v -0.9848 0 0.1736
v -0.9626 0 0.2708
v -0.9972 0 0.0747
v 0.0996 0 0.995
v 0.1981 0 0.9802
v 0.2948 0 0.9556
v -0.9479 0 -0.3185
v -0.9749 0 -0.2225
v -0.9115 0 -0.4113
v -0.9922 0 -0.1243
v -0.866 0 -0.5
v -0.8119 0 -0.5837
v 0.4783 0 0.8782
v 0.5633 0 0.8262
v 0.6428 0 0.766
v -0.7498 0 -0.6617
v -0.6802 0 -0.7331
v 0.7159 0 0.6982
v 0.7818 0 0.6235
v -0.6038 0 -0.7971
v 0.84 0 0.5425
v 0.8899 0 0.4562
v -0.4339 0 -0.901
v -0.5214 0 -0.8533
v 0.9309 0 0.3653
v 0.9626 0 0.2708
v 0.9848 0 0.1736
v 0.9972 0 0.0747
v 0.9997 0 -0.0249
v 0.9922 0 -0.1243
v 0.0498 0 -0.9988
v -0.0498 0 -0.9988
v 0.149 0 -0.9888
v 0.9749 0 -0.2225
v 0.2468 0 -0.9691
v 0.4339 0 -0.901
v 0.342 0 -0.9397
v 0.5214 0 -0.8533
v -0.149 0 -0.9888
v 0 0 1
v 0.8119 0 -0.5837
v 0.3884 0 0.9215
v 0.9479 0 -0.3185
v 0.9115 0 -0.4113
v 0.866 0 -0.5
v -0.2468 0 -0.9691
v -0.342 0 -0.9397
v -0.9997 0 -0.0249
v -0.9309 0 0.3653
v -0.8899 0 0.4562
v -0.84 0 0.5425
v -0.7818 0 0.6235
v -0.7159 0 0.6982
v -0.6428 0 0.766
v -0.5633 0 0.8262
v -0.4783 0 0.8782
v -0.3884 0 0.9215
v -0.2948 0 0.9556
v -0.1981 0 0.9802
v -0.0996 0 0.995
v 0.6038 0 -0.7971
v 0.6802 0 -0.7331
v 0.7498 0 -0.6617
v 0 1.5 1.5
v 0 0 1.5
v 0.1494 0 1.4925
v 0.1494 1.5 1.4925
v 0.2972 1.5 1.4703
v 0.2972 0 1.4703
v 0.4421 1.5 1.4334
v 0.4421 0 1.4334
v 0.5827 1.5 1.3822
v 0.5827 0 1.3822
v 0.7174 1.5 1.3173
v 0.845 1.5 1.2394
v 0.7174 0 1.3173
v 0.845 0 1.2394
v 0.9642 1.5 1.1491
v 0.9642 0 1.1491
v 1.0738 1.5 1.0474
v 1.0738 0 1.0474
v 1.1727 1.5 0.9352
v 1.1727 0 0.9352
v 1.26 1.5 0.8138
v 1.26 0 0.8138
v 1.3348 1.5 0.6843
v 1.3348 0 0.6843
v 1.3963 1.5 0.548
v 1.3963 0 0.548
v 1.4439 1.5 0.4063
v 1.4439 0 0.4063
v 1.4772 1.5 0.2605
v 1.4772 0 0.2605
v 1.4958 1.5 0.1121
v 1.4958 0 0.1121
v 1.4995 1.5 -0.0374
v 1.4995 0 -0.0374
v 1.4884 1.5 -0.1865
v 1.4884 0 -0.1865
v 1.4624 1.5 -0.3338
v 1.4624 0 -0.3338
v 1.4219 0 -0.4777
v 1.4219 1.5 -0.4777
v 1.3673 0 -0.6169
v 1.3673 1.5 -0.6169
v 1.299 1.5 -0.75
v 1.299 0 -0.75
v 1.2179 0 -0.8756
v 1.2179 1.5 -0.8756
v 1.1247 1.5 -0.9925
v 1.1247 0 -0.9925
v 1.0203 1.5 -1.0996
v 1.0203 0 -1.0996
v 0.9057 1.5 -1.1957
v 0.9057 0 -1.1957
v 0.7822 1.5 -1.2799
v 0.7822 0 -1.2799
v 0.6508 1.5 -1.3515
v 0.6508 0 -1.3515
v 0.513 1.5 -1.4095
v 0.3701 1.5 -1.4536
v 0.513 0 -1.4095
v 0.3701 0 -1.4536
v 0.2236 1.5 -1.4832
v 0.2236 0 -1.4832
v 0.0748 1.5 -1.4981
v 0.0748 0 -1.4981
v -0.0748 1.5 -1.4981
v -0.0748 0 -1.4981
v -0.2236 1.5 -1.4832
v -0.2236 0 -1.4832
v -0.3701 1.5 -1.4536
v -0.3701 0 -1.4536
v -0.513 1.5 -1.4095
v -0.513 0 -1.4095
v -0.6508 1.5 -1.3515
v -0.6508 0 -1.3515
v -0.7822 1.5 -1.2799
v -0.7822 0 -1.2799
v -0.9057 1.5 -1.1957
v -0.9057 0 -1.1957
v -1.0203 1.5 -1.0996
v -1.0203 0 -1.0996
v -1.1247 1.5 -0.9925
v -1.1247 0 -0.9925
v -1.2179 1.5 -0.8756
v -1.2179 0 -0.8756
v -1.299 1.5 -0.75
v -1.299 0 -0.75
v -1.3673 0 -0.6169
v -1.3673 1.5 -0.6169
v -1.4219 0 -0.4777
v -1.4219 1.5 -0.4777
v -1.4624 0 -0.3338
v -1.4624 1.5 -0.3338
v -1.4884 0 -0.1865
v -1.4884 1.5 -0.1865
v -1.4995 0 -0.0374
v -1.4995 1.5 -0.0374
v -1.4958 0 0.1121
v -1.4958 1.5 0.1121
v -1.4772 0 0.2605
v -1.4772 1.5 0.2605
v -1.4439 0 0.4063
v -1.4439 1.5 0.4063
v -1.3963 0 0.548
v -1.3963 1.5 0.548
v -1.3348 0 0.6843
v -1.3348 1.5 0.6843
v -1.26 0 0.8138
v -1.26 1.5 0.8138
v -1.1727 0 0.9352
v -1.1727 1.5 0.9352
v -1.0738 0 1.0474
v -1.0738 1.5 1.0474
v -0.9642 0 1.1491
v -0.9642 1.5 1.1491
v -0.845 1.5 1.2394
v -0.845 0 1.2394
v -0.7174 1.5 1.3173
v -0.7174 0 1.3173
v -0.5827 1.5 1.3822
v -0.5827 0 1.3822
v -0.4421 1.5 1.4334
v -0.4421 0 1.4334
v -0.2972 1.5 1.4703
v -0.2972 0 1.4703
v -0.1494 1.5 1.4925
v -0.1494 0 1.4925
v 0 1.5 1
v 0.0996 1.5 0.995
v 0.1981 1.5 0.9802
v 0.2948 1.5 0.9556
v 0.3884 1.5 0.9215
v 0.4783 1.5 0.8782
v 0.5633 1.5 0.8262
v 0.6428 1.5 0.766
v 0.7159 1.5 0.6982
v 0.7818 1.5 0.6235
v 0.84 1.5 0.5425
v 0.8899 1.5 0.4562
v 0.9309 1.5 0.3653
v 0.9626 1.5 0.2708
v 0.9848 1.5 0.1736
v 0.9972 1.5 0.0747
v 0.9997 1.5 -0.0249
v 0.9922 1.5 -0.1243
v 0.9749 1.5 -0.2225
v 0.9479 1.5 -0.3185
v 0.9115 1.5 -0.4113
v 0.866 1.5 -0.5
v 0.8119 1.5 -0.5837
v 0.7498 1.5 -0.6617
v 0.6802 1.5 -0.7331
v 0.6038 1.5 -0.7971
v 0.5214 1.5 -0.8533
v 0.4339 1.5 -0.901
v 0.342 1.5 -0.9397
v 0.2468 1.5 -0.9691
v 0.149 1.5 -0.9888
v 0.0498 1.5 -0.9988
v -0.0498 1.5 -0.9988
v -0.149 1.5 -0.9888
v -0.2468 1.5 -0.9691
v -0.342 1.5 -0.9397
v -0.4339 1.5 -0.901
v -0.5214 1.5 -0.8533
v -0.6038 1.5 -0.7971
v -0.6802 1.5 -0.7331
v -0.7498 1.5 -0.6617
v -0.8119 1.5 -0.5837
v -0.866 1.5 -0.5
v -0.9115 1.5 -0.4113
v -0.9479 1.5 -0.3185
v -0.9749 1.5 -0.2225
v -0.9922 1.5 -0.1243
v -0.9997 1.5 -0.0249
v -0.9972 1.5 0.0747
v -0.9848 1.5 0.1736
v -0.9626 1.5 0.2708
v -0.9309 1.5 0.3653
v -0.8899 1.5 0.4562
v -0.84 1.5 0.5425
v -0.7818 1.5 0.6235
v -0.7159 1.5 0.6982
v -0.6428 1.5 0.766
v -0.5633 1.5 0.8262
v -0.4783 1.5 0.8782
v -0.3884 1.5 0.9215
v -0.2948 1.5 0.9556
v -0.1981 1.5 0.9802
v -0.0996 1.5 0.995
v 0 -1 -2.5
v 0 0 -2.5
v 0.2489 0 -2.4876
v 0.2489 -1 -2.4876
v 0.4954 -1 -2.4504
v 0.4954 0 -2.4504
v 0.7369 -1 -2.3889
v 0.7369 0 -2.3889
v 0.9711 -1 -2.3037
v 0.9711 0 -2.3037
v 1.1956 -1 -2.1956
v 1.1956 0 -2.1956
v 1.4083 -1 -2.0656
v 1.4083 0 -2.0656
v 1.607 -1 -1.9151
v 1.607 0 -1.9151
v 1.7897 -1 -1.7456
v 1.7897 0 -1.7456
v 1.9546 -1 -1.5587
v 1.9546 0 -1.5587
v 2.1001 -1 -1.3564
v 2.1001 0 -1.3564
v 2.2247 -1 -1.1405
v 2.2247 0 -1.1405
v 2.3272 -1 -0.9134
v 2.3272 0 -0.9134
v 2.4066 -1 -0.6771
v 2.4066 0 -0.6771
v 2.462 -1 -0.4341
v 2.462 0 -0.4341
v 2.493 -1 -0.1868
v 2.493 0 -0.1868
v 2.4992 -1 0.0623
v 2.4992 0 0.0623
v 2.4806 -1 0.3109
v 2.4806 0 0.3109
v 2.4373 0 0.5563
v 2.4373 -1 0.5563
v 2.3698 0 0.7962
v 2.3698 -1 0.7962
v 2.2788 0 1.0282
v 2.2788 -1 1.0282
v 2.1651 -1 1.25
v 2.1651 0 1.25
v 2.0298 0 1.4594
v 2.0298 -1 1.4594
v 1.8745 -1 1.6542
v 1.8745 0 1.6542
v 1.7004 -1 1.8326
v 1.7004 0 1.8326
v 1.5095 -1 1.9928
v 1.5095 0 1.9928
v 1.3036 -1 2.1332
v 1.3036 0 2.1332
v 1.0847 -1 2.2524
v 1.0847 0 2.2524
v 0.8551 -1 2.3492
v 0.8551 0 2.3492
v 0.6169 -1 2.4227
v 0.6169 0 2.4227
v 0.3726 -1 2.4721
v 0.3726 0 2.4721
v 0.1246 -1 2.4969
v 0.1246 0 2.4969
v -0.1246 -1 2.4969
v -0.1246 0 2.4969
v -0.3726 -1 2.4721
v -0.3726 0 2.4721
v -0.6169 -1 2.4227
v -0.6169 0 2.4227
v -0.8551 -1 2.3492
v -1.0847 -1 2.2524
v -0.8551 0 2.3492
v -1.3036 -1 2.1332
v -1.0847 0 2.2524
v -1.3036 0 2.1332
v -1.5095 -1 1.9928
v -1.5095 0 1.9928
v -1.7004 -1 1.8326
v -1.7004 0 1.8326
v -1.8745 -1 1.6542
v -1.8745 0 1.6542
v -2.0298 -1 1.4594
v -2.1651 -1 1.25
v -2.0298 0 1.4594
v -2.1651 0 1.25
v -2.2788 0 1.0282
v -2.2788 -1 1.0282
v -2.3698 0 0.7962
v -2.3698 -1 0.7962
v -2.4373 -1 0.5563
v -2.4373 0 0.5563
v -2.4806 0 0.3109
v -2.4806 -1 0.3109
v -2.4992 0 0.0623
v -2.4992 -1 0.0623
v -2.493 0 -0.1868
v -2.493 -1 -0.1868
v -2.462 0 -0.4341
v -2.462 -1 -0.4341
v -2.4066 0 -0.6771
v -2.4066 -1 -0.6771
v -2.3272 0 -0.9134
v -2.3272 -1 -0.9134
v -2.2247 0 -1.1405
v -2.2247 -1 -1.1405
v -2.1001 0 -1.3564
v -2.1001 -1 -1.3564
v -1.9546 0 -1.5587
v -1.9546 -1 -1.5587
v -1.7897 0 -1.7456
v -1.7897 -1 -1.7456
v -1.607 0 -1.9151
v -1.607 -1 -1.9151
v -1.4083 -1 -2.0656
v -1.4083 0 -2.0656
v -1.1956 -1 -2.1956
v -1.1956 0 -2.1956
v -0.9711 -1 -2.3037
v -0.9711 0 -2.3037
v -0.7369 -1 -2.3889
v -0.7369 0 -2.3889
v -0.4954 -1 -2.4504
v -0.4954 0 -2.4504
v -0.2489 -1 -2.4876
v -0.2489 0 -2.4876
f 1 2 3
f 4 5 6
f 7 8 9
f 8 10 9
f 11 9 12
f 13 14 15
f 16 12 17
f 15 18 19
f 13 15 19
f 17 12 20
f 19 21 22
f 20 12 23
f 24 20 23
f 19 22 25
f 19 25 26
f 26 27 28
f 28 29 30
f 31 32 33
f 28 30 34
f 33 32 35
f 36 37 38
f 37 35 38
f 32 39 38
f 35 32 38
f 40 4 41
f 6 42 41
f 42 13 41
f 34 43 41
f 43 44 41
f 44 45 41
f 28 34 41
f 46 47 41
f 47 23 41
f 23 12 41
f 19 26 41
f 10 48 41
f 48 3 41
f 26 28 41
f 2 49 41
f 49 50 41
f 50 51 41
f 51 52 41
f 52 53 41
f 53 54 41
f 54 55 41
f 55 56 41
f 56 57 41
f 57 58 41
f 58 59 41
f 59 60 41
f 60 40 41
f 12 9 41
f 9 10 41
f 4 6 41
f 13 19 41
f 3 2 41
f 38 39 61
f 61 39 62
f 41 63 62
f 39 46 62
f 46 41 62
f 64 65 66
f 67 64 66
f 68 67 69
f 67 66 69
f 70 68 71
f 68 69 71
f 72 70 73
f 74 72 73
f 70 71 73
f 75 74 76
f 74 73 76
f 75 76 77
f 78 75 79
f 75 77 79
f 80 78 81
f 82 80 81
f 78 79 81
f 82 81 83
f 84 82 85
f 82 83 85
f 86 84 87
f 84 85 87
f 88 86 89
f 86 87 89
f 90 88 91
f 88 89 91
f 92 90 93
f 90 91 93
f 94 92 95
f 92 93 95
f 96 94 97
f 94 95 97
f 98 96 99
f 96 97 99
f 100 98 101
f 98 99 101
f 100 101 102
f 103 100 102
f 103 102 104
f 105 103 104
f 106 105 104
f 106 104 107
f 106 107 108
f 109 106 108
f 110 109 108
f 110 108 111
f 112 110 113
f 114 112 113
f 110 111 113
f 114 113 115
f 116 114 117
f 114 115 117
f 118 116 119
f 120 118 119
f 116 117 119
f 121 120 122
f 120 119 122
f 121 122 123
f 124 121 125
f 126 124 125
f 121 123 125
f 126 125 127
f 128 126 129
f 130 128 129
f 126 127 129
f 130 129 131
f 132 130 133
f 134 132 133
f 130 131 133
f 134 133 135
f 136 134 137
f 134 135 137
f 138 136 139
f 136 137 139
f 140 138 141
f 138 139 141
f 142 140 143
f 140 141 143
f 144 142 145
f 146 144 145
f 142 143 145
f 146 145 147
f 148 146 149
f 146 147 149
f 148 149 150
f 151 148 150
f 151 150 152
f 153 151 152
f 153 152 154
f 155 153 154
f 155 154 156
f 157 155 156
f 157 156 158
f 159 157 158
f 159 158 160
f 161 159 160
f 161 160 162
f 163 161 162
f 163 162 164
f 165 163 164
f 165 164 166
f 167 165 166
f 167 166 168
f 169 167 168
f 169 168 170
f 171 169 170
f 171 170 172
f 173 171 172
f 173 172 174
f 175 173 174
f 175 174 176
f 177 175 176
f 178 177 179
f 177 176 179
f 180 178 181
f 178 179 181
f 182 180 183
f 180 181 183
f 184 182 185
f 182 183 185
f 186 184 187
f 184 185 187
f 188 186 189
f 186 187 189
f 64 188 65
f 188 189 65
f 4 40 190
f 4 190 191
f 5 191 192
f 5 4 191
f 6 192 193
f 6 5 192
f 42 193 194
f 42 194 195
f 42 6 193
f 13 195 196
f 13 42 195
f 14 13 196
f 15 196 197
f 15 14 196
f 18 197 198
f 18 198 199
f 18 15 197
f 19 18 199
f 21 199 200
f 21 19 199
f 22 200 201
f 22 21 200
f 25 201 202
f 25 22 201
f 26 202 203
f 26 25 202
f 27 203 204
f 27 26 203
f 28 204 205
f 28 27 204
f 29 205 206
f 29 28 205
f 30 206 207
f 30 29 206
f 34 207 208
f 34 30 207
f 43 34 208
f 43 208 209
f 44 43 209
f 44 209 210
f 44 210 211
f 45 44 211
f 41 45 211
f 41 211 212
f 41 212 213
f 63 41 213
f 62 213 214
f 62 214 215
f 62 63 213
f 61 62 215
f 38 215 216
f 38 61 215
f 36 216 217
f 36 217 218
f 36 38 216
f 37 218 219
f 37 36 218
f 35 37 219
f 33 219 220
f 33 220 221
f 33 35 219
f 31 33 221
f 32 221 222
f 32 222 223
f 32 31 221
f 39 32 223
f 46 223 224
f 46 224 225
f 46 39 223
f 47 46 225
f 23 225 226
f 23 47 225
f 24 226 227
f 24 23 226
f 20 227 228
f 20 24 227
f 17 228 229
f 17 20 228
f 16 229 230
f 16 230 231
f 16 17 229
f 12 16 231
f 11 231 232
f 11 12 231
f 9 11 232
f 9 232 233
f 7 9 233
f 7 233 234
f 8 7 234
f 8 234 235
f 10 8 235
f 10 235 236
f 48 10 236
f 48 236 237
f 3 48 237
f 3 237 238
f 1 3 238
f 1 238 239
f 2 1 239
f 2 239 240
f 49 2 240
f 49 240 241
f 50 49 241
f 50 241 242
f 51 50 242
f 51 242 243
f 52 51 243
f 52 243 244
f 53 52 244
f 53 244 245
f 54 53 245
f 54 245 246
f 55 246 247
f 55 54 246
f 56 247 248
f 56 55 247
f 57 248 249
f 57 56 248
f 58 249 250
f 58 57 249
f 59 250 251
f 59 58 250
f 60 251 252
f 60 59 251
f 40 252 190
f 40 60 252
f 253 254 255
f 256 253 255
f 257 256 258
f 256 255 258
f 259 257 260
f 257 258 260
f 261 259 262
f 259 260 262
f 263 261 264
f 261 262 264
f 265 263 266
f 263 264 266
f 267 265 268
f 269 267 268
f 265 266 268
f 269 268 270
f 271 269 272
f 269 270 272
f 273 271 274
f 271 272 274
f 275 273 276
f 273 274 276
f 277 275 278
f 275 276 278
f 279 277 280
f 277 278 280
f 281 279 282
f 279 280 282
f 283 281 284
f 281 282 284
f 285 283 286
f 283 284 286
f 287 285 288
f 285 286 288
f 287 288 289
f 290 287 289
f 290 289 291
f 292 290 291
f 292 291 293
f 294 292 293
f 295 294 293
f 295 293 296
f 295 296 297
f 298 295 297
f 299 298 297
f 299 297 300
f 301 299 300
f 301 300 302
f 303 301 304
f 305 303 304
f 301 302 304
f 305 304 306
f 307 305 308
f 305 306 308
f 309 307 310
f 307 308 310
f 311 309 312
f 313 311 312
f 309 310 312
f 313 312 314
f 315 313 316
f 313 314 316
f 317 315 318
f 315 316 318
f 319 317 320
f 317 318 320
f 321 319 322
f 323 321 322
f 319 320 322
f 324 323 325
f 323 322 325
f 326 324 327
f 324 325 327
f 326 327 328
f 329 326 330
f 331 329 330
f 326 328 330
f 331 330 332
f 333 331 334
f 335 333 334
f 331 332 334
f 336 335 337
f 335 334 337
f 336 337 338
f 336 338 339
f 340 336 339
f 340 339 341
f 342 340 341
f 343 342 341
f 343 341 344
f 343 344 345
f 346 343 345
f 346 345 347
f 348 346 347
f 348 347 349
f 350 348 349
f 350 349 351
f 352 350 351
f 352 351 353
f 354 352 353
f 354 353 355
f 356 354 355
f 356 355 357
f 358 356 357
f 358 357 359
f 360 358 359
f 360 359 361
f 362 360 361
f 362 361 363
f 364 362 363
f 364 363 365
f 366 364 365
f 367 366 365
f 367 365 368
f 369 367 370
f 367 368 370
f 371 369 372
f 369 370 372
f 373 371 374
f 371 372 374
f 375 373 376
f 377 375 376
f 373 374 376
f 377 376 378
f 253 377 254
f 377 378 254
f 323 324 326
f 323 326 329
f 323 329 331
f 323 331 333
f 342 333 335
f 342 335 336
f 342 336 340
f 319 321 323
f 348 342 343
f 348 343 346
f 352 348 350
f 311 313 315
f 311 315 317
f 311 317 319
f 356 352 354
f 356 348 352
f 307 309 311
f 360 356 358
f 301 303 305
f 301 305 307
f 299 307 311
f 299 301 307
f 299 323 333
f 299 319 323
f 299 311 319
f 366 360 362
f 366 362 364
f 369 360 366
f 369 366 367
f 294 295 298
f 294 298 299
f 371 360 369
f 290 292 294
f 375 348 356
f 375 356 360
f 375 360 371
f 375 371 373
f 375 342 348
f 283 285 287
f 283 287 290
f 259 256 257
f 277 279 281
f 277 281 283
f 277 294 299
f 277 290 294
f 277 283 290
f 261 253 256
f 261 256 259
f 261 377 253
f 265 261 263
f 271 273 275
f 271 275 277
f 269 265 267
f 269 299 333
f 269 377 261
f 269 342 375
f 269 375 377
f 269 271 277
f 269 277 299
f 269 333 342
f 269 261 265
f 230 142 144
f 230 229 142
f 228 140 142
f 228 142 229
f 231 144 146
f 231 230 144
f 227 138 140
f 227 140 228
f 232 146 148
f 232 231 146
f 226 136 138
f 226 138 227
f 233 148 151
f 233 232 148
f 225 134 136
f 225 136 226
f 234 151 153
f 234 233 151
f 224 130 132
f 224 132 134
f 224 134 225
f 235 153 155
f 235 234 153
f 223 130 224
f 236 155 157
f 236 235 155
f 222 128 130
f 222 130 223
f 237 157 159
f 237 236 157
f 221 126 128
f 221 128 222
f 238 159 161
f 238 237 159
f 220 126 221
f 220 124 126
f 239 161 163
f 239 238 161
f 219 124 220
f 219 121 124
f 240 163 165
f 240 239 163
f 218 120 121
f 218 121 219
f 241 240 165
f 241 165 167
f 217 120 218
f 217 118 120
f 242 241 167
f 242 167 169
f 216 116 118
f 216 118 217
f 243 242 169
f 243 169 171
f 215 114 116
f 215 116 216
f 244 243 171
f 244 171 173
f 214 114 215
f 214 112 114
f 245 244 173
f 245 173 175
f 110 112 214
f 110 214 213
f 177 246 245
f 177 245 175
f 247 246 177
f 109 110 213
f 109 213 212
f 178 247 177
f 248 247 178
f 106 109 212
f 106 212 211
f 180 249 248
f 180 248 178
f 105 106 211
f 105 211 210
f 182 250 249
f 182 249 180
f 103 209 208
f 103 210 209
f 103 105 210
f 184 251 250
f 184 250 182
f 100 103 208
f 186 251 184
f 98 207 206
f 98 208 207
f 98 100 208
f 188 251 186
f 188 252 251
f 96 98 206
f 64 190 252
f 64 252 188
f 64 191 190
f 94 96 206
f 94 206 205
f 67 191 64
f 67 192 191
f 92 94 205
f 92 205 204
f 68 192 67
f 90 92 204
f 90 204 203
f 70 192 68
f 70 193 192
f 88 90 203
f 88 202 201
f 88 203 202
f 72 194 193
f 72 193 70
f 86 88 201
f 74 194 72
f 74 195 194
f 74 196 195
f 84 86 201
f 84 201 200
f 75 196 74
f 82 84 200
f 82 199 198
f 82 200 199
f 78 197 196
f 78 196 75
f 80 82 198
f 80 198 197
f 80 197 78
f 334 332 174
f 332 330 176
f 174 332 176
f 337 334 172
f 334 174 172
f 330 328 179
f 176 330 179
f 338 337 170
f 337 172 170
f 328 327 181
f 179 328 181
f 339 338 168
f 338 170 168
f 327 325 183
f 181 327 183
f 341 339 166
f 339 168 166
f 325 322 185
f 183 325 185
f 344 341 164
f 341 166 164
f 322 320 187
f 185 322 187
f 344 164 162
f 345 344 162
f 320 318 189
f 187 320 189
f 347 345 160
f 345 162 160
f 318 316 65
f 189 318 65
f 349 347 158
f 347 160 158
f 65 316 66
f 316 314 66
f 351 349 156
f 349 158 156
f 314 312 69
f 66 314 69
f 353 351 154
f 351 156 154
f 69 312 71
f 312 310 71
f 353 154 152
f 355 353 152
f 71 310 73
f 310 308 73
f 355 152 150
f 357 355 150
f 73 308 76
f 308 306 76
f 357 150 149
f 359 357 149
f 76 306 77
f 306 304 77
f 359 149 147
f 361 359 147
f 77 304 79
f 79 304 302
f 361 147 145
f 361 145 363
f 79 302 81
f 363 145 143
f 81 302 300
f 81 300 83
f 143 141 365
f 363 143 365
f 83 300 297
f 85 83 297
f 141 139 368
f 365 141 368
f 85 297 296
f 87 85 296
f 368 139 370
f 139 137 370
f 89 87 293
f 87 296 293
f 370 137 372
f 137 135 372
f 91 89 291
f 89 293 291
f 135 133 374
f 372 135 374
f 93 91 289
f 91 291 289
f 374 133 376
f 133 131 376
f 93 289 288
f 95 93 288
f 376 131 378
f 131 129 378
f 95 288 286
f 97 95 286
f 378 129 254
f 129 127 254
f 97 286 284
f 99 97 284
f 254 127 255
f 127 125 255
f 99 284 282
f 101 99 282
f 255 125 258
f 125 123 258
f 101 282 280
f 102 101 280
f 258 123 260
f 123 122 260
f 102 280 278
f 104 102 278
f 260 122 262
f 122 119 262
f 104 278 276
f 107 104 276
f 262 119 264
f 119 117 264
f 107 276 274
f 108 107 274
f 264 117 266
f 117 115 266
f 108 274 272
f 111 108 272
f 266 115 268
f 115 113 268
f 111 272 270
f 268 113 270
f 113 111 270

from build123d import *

# Parameters (mm, degrees)
SKETCH_1_R      = 1.5
SKETCH_1_R_2    = 1
EXTRUDE_1_DEPTH = 1.5
SKETCH_2_R      = 2.5
EXTRUDE_2_DEPTH = 1


with BuildPart() as part:
    # 草图1 → 凸台-拉伸1 (new body)
    with BuildSketch(Plane(origin=(0, 0, 0), x_dir=(1, 0, 0), z_dir=(0, 1, 0))):
        with Locations(Location((0, 0, 0), (0, 0, 270))):
            Circle(SKETCH_1_R)
        with Locations(Location((0, 0, 0), (0, 0, 270))):
            Circle(SKETCH_1_R_2, mode=Mode.SUBTRACT)
    extrude(amount=EXTRUDE_1_DEPTH)

    # 草图2 → 凸台-拉伸2 (add)
    with BuildSketch(Plane.XZ):
        with Locations(Location((0, 0, 0), (0, 0, 270))):
            Circle(SKETCH_2_R)
    extrude(amount=EXTRUDE_2_DEPTH)


solid = part.part
